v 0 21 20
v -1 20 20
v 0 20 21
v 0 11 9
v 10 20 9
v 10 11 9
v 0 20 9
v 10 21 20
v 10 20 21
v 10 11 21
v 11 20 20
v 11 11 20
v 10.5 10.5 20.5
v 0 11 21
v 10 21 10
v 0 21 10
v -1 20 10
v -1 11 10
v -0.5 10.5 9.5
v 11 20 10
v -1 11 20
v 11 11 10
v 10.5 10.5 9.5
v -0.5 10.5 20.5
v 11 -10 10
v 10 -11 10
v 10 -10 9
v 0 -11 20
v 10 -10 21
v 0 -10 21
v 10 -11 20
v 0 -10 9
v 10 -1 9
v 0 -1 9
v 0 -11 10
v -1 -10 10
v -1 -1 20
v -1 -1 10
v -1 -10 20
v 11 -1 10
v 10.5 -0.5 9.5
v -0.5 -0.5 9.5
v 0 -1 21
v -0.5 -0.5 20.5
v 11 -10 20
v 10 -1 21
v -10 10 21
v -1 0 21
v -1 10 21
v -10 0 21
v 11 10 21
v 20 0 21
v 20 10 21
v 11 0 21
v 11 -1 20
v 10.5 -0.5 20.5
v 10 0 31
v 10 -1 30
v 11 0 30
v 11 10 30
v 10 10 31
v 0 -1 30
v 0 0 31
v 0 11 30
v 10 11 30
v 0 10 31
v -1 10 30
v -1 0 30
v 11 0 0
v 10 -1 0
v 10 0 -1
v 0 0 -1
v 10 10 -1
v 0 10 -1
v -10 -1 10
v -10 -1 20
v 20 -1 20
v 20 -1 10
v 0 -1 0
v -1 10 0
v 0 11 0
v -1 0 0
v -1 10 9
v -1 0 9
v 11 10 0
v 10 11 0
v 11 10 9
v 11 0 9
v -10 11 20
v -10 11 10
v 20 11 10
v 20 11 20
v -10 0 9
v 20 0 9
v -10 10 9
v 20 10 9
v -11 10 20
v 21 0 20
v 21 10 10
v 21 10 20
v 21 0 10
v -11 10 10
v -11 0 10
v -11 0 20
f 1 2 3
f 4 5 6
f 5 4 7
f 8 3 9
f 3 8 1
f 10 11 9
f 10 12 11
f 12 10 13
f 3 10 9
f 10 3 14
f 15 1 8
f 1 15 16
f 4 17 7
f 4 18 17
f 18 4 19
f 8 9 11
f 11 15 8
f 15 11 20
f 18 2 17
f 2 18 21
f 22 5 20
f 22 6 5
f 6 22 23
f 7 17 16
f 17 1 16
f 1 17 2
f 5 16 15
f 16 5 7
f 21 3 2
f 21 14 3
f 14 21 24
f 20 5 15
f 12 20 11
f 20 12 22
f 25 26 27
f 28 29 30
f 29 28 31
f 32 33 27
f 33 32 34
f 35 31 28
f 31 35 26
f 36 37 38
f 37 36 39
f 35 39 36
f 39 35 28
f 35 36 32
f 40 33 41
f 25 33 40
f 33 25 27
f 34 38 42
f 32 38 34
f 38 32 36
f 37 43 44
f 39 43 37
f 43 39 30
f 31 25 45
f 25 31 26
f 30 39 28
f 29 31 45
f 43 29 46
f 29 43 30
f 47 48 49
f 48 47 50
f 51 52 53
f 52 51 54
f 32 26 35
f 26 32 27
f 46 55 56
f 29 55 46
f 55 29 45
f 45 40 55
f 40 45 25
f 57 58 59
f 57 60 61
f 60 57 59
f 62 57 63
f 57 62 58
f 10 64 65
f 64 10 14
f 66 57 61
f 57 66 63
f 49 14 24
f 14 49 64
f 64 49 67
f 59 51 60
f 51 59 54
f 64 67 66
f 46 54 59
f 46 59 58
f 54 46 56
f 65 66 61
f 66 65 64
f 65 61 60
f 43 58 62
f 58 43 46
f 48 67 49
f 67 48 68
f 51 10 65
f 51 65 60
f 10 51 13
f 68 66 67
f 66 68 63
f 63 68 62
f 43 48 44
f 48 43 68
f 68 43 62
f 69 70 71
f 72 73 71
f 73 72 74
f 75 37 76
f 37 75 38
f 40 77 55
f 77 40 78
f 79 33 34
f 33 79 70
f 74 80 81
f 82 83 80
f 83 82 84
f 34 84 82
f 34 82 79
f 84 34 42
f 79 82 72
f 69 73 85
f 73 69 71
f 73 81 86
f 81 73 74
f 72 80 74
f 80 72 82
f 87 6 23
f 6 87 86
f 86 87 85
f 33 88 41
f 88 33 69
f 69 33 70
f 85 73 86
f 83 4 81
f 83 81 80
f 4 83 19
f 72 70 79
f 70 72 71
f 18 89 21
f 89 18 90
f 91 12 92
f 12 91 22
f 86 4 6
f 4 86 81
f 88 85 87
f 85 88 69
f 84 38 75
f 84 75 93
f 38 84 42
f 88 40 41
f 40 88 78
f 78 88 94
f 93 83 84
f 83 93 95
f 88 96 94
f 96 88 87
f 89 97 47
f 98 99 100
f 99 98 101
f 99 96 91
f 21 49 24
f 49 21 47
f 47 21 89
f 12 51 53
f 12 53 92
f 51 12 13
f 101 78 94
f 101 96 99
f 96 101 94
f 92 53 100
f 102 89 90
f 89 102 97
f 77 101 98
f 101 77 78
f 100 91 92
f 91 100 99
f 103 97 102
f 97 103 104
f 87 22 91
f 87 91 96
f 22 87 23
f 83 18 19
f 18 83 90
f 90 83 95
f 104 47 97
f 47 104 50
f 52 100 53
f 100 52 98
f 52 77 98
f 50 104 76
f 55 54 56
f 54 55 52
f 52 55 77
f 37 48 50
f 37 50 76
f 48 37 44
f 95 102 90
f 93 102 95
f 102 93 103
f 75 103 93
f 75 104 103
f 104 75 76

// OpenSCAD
octapoints = [
                [0,-1,0],
                [1,0,0],
                [0,1,0],
                [-1,0,0],
                [0,0,1],
                [0,0,-1]
             ];

octafaces = [
                [0,4,1],
                [1,4,2],
                [2,4,3],
                [3,4,0],
                [0,1,5],
                [1,2,5],
                [2,3,5],
                [3,0,5]          
            ];

minkowski(){
polyhedron(octapoints,octafaces);
union(){
    cube([10,10,30]);
    translate([-10,0,10])cube([30,10,10]);
    translate([0,-10,10])cube([10,30,10]);
}
}
